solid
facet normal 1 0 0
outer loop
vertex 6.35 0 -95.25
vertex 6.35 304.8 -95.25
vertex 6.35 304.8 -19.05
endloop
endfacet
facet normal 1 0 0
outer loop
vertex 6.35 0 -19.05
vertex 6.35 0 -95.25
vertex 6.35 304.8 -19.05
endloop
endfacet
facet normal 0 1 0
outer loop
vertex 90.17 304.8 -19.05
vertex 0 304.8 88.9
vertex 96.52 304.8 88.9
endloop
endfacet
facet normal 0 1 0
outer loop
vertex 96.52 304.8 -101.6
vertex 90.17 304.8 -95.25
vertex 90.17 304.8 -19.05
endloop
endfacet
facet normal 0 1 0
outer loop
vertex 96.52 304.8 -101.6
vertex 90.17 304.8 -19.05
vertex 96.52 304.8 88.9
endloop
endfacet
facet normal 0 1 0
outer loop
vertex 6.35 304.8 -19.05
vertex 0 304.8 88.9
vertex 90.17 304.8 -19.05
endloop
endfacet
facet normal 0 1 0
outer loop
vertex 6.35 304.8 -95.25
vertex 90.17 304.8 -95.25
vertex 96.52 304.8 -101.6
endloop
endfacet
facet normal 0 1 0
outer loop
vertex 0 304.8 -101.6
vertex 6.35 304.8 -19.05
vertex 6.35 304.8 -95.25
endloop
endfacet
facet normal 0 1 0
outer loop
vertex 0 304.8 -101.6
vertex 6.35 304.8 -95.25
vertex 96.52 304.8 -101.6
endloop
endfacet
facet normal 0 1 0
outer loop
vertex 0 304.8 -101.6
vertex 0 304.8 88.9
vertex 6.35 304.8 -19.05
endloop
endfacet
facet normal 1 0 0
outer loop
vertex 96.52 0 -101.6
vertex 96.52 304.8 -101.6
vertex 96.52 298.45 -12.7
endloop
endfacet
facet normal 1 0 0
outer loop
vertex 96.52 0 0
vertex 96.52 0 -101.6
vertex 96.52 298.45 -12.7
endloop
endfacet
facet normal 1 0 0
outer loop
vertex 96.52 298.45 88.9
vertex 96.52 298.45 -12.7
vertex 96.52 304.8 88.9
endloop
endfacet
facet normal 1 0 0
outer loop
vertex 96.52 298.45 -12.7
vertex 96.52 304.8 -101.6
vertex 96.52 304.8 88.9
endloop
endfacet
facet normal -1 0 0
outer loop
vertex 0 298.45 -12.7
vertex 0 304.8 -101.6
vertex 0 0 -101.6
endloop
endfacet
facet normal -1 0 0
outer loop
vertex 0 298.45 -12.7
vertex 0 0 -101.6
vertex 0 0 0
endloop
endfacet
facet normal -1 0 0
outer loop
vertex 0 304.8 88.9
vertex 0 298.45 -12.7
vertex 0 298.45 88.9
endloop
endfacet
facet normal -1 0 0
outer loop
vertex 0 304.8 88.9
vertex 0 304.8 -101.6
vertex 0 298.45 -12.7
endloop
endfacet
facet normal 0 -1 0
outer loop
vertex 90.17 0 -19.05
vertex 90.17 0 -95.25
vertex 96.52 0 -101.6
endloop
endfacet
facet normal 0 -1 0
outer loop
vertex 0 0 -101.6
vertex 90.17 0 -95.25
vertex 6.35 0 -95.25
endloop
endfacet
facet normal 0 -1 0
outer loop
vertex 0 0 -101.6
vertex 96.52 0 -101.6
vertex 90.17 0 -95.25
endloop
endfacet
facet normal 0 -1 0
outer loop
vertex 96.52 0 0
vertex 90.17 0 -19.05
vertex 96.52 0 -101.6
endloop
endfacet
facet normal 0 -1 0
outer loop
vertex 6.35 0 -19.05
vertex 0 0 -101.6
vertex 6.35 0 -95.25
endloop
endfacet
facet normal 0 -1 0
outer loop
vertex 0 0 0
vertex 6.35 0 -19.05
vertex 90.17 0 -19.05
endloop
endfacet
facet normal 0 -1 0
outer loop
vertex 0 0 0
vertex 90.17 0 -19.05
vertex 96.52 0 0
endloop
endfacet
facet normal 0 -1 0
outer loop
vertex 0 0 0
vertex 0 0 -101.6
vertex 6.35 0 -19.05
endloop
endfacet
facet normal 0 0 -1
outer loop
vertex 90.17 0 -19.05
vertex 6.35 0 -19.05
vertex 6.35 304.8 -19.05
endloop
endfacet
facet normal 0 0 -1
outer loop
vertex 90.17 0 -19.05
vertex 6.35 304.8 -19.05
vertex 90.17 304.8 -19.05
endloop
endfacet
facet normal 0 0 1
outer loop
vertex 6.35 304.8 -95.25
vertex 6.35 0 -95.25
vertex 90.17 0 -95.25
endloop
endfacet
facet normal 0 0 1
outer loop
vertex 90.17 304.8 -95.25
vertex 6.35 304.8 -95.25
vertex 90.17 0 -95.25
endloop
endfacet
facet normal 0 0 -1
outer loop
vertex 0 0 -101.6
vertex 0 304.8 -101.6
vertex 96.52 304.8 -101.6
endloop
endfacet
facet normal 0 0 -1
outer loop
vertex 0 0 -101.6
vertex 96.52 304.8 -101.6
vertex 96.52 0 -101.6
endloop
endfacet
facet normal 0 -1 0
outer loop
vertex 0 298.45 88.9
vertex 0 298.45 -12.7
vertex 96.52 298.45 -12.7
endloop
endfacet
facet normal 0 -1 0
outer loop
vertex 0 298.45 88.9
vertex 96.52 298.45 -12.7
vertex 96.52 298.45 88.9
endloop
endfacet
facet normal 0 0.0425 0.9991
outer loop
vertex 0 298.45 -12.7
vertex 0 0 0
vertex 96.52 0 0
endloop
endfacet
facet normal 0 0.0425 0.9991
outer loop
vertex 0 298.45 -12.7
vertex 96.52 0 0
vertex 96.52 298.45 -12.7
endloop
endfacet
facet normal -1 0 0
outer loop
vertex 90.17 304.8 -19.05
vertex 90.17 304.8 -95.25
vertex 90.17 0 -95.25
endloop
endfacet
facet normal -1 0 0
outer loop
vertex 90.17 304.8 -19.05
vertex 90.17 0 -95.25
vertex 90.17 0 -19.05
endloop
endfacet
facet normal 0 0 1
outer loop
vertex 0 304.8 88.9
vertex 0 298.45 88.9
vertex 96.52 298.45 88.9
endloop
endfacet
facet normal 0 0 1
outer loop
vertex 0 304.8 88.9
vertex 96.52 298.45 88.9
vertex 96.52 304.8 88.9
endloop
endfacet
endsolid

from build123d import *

# Parameters (mm, degrees)
BOSS_EXTRUDE1_DEPTH = 96.52
SKETCH2_W           = 83.82
SKETCH2_H           = 76.2
CUT_EXTRUDE1_DEPTH  = 305.8


with BuildPart() as part:
    # Sketch1 → Boss-Extrude1 (new body)
    with BuildSketch(Plane(origin=(0, 0, 0), x_dir=(0, 0, -1), z_dir=(1, 0, 0))):
        Polygon((0, 0), (12.7, 298.45), (-88.9, 298.45), (-88.9, 304.8), (101.6, 304.8), (101.6, 0), align=None)
    extrude(amount=BOSS_EXTRUDE1_DEPTH)

    # Sketch2 → Cut-Extrude1 (cut, through all)
    with BuildSketch(Plane.XZ):
        with Locations((48.26, -57.15)):
            Rectangle(SKETCH2_W, SKETCH2_H)
    extrude(amount=-CUT_EXTRUDE1_DEPTH, mode=Mode.SUBTRACT)


solid = part.part
